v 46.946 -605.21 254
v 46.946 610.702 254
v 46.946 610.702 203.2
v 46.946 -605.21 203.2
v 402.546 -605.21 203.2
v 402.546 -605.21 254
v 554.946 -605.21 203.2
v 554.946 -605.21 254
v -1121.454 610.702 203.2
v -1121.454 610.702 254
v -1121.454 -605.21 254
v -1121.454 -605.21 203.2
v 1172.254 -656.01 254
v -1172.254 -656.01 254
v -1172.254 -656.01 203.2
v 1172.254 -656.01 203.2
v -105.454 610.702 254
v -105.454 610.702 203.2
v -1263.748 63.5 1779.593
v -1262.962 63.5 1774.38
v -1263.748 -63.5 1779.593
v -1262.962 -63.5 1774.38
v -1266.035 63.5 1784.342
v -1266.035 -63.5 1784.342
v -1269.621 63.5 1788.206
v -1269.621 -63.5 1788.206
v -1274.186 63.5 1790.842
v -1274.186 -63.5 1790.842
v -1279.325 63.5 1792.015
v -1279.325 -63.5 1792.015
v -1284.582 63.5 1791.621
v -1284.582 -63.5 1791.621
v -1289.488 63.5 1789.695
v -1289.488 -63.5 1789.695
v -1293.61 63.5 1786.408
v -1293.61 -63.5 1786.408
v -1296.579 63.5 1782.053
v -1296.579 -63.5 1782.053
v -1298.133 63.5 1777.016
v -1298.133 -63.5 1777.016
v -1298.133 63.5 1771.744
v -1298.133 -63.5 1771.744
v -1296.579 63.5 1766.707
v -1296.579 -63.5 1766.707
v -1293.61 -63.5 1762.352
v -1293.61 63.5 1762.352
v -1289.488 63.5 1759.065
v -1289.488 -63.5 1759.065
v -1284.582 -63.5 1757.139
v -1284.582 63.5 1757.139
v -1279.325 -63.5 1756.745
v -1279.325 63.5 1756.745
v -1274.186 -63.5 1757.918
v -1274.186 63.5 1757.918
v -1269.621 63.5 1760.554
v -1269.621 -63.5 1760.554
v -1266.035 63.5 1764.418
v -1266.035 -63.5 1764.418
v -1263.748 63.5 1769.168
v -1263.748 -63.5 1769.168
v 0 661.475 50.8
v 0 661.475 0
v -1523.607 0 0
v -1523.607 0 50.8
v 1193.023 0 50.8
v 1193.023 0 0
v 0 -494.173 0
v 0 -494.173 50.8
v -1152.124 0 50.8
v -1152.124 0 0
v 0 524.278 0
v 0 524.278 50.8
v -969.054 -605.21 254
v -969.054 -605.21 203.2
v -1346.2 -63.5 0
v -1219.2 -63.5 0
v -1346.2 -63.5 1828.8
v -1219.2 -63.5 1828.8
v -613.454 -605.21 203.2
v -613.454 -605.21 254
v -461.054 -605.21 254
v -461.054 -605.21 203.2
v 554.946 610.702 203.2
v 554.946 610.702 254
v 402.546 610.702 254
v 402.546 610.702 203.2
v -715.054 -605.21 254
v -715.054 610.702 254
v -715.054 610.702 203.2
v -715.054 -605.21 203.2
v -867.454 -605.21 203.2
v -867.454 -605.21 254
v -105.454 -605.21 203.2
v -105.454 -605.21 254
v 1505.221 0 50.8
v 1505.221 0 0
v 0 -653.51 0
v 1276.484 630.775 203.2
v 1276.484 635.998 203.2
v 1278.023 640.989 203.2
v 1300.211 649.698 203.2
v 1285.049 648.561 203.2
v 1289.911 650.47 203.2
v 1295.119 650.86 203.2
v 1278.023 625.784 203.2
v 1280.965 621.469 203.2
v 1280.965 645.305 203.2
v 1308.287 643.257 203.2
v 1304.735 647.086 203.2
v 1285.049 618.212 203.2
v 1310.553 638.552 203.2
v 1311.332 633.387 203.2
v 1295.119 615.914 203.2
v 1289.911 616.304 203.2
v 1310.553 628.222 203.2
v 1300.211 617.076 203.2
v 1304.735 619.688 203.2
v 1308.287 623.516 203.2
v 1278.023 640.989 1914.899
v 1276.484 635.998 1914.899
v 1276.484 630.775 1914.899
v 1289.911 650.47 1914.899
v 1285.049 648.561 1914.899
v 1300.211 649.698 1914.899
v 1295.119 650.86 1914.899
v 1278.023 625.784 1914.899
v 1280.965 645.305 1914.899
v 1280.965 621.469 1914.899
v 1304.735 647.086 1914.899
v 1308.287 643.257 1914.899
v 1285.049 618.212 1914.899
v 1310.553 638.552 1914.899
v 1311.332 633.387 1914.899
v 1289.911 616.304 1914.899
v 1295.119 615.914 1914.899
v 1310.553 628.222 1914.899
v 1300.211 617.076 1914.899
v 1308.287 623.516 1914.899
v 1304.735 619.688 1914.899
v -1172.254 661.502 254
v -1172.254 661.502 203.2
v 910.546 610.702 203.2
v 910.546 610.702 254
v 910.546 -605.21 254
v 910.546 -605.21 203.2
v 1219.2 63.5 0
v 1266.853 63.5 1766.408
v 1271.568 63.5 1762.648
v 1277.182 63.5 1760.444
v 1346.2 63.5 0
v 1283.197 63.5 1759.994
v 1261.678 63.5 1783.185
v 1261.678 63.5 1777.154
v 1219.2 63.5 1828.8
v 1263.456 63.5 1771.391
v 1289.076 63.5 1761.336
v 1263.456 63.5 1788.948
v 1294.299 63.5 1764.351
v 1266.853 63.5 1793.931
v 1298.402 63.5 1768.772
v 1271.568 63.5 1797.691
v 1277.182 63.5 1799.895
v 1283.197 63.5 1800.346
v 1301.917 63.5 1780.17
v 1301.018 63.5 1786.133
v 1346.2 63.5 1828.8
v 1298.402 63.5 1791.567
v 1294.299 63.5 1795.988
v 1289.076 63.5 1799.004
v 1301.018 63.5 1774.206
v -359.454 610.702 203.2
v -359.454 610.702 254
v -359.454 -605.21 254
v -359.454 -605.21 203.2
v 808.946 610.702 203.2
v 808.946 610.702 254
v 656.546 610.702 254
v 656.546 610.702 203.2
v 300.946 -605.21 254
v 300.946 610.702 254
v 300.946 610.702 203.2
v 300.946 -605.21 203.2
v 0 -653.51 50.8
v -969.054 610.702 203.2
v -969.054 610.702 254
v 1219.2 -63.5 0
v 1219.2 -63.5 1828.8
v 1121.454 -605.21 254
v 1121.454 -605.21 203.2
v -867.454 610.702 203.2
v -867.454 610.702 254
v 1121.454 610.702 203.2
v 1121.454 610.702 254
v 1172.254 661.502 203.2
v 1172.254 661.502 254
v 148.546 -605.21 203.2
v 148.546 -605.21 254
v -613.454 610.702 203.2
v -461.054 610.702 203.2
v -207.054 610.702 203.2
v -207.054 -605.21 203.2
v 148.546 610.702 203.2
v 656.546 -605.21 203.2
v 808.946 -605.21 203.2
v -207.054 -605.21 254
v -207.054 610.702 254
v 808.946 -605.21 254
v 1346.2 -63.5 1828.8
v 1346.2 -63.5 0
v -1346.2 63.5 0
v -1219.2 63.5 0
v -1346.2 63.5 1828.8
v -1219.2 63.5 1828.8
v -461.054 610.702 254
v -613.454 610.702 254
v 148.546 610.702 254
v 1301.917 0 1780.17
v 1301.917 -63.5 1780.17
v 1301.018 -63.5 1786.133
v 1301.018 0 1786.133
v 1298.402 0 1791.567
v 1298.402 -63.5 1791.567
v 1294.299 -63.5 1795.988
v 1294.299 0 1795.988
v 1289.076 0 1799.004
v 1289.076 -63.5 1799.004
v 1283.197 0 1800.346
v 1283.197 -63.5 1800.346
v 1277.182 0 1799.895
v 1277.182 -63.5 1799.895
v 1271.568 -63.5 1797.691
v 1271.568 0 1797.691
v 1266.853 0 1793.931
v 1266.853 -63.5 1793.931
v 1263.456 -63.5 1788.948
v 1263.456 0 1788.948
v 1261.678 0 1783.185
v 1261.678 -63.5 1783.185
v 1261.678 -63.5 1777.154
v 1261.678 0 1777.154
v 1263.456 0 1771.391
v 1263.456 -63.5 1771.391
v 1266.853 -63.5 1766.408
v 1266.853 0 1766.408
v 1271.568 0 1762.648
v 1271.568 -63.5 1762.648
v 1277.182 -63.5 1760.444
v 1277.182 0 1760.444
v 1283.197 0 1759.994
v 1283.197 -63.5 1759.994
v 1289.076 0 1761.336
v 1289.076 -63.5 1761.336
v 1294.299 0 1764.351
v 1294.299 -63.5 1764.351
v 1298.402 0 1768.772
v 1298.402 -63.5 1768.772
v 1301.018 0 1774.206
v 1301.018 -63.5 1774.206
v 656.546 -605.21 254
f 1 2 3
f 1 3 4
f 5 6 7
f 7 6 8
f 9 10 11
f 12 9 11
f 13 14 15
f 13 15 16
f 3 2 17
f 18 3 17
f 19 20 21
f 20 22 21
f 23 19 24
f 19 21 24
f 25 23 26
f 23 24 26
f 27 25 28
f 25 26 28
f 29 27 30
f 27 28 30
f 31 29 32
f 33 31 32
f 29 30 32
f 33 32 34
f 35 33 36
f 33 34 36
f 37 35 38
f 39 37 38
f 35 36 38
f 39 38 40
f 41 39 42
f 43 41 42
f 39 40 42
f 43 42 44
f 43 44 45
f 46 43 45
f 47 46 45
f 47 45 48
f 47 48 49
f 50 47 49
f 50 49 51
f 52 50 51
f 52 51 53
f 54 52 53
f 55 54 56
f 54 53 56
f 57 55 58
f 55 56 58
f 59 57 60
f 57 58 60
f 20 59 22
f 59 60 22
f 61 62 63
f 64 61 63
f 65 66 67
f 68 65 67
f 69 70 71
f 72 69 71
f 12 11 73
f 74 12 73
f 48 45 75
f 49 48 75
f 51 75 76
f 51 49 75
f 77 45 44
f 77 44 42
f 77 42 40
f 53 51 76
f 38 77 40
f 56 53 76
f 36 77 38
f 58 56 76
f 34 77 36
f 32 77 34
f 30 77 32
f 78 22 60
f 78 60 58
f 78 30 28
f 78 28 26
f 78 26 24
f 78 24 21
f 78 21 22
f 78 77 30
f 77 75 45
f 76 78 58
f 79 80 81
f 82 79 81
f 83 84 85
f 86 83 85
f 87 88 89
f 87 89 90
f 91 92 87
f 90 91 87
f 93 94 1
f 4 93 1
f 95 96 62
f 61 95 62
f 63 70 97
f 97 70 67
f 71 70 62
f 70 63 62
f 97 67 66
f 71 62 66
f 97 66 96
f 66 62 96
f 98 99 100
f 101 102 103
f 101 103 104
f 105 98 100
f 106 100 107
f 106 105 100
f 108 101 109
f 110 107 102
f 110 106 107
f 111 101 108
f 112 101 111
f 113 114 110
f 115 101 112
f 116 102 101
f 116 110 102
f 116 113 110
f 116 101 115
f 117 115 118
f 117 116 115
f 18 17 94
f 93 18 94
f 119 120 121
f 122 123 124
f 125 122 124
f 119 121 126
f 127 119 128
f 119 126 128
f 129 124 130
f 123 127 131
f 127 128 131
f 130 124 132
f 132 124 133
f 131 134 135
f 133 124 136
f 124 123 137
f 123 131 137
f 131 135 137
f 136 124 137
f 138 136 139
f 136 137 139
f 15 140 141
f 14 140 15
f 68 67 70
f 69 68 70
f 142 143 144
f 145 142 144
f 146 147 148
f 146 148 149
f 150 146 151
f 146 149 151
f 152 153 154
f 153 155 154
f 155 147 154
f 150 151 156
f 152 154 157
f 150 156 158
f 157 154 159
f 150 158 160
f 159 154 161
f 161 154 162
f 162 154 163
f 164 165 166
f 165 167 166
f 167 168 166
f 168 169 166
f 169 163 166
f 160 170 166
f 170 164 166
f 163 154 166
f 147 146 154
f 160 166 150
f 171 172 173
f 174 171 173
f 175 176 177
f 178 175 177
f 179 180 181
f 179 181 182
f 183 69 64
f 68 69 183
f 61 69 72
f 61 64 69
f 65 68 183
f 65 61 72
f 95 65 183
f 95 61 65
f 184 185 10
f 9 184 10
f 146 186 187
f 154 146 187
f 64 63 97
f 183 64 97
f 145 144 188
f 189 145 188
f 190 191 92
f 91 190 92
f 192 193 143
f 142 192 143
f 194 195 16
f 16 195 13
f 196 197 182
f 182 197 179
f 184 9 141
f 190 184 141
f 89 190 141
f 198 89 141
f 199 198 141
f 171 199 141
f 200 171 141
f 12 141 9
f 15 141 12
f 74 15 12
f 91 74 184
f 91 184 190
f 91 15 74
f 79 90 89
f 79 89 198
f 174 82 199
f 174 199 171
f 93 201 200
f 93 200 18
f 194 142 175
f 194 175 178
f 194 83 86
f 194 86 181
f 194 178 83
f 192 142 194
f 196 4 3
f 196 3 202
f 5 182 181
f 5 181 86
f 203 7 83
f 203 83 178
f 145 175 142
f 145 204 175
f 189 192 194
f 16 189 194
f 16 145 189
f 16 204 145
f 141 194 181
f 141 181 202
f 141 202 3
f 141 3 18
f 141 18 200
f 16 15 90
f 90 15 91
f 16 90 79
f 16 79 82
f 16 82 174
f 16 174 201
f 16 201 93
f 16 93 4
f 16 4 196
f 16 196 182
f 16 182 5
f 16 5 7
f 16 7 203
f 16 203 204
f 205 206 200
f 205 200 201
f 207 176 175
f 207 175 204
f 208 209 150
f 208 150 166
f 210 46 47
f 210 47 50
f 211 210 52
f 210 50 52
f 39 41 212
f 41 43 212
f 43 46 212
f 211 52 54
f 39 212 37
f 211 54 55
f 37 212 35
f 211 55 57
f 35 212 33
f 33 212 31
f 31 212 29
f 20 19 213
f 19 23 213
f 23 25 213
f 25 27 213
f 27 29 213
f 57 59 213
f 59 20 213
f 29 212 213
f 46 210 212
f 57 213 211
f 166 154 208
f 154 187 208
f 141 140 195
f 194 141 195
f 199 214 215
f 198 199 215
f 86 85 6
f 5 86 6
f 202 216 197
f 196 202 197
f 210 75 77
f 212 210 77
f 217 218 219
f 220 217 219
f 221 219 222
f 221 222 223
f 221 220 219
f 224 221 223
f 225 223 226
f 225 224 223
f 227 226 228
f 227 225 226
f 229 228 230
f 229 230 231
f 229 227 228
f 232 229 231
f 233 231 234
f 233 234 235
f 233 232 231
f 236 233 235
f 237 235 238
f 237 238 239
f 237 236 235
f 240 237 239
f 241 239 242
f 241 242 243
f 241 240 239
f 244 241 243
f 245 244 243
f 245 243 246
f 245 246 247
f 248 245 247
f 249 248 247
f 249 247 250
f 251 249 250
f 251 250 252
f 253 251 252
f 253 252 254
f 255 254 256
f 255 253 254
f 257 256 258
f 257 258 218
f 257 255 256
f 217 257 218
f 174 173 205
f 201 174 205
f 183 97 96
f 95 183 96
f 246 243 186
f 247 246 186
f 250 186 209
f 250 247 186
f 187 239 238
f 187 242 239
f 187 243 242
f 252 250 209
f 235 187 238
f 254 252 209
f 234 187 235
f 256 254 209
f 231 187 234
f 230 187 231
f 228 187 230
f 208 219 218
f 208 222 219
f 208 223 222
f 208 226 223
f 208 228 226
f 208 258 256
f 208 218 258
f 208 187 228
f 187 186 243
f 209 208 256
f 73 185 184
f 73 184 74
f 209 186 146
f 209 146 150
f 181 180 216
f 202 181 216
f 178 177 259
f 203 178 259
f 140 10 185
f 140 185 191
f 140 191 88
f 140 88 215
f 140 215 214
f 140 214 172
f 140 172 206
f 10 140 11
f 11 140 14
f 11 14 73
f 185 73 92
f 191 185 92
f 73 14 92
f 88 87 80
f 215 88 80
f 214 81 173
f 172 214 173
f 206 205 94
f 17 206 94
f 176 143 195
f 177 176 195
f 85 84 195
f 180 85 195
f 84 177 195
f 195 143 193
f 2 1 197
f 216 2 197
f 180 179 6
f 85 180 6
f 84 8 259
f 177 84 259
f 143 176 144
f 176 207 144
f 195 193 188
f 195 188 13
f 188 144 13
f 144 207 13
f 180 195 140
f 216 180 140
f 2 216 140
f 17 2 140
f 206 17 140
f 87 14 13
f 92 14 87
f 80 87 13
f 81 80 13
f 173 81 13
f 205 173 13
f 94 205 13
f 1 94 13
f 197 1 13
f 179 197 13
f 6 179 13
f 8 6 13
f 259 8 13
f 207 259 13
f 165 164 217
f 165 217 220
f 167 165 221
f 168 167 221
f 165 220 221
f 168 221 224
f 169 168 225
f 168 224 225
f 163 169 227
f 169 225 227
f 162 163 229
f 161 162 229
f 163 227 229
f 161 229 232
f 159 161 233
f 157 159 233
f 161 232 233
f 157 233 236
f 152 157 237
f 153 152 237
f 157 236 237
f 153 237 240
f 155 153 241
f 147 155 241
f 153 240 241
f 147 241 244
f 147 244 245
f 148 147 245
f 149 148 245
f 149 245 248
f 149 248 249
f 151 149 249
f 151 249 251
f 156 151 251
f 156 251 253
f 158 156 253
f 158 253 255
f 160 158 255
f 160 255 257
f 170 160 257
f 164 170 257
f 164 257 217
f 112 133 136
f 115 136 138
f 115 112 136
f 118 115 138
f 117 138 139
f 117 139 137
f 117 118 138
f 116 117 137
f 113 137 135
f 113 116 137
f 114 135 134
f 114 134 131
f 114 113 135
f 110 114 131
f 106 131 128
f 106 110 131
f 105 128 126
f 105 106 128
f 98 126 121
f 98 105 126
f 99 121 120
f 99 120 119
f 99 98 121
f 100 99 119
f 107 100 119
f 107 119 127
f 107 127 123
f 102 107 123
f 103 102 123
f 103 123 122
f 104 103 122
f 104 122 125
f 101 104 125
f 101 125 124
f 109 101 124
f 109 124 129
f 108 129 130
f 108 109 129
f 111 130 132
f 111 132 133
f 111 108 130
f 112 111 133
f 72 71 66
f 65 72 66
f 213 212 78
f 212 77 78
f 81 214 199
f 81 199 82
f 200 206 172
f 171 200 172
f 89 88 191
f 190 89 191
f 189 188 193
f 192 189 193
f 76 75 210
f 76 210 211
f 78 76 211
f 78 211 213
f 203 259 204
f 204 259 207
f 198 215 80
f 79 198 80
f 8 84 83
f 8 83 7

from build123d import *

# Parameters (mm, degrees)
F0_W          = 127
F0_H          = 1828.8
F1_DEPTH      = 63.5
F2_W          = 2344.5084095001
F2_H          = 1312.0200634003
F3_DEPTH      = 76.2
F4_R          = 17.6840509658
F5_DEPTH      = 656.0110317001
F5_DEPTH_BACK = 166.414886713
F6_R          = 20.2324998559
F7_DEPTH      = 63.5
F7_DEPTH_BACK = 170.9811687469
F9_DEPTH      = 50.8
F10_W         = 2344.5084095001
F10_H         = 135.2661035061
F11_DEPTH     = 1320.8
F13_W         = 2344.5084095001
F13_H         = 1317.5123929977
F13_W_2       = 101.6
F13_H_2       = 1215.9123929977
F14_DEPTH     = 50.8
F16_DEPTH     = 50.8
F21_R         = 17.5219317268
F22_DEPTH     = 1711.6990089417


with BuildPart() as f1:
    # F0 (on Front) → F1 (new body, symmetric)
    with BuildSketch(Plane.XZ):
        with Locations((-1282.7, 914.4)):
            Rectangle(F0_W, F0_H)
    extrude(amount=F1_DEPTH, both=True)

    # F4 (on Front) → F5 (cut, two sides)
    with BuildSketch(Plane.XZ) as f5_sk:
        with Locations((-1280.646443367, 1774.3800878525)):
            Circle(F4_R)
    extrude(amount=F5_DEPTH, mode=Mode.SUBTRACT)
    extrude(f5_sk.sketch, amount=-F5_DEPTH_BACK, mode=Mode.SUBTRACT)


with BuildPart() as f1b:
    # F0 (on Front) → F1, piece 2 (new body, symmetric)
    with BuildSketch(Plane.XZ):
        with Locations((1282.7, 914.4)):
            Rectangle(F0_W, F0_H)
    extrude(amount=F1_DEPTH, both=True)

    # F6 (on Front) → F7 (cut, two sides)
    with BuildSketch(Plane.XZ) as f7_sk:
        with Locations((1281.6846370697, 1780.1696062088)):
            Circle(F6_R)
    extrude(amount=F7_DEPTH, mode=Mode.SUBTRACT)
    extrude(f7_sk.sketch, amount=-F7_DEPTH_BACK, mode=Mode.SUBTRACT)


with BuildPart() as f3:
    # F2 (on Top) → F3 (new body)
    with BuildSketch(Plane.XY):
        Rectangle(F2_W, F2_H)
    extrude(amount=F3_DEPTH)


with BuildPart() as f9:
    # F8 (on Top) → F9 (new body)
    with BuildSketch(Plane.XY):
        Polygon((0, 661.4745634012), (-1523.6068986396, 0), (0, -653.5100268468), (1505.2209768039, 0), align=None)
        Polygon((0, -494.172642375), (-1152.1243991841, 0), (0, 524.2779540986), (1193.022706916, 0), align=None, mode=Mode.SUBTRACT)
    extrude(amount=F9_DEPTH)


with BuildPart() as f11:
    # F10 (on face) → F11 (new body)
    with BuildSketch(Plane.XZ.offset(656.0100317001)):
        with Locations((0, 321.633051753)):
            Rectangle(F10_W, F10_H)
    extrude(amount=-F11_DEPTH)

    # F13 (on face) → F14 (join)
    with BuildSketch(Plane(origin=(0, 0, 254), x_dir=(1, 0, 0), z_dir=(0, 0, -1))):
        with Locations((0, -2.7461647987)):
            Rectangle(F13_W, F13_H)
        Polygon((-1121.4542047501, -610.7023612976), (-1121.4542047501, 605.2100317001), (-969.0542047501, 605.2100317001), (-867.4542047501, 605.2100317001), (-715.0542047501, 605.2100317001), (-613.4542047501, 605.2100317001), (-461.0542047501, 605.2100317001), (-359.4542047501, 605.2100317001), (-207.0542047501, 605.2100317001), (-105.4542047501, 605.2100317001), (46.9457952499, 605.2100317001), (148.5457952499, 605.2100317001), (300.9457952499, 605.2100317001), (402.5457952499, 605.2100317001), (554.9457952499, 605.2100317001), (656.5457952499, 605.2100317001), (808.9457952499, 605.2100317001), (910.5457952499, 605.2100317001), (1121.4542047501, 605.2100317001), (1121.4542047501, -610.7023612976), (910.5457952499, -610.7023612976), (808.9457952499, -610.7023612976), (656.5457952499, -610.7023612976), (554.9457952499, -610.7023612976), (402.5457952499, -610.7023612976), (300.9457952499, -610.7023612976), (148.5457952499, -610.7023612976), (46.9457952499, -610.7023612976), (-105.4542047501, -610.7023612976), (-207.0542047501, -610.7023612976), (-359.4542047501, -610.7023612976), (-461.0542047501, -610.7023612976), (-613.4542047501, -610.7023612976), (-715.0542047501, -610.7023612976), (-867.4542047501, -610.7023612976), (-969.0542047501, -610.7023612976), align=None, mode=Mode.SUBTRACT)
        with Locations((605.7457952499, -2.7461647987)):
            Rectangle(F13_W_2, F13_H_2)
        with Locations((-156.2542047501, -2.7461647987)):
            Rectangle(F13_W_2, F13_H_2)
        with Locations((-664.2542047501, -2.7461647987)):
            Rectangle(F13_W_2, F13_H_2)
        with Locations((97.7457952499, -2.7461647987)):
            Rectangle(F13_W_2, F13_H_2)
        with Locations((-410.2542047501, -2.7461647987)):
            Rectangle(F13_W_2, F13_H_2)
        with Locations((859.7457952499, -2.7461647987)):
            Rectangle(F13_W_2, F13_H_2)
        with Locations((-918.2542047501, -2.7461647987)):
            Rectangle(F13_W_2, F13_H_2)
        with Locations((351.7457952499, -2.7461647987)):
            Rectangle(F13_W_2, F13_H_2)
    extrude(amount=F14_DEPTH)


with BuildPart() as f16:
    # F13 (on face) → F16 (new body)
    with BuildSketch(Plane(origin=(0, 0, 254), x_dir=(1, 0, 0), z_dir=(0, 0, -1))):
        with Locations((0, -2.7461647987)):
            Rectangle(F13_W, F13_H)
        Polygon((-1121.4542047501, -610.7023612976), (-1121.4542047501, 605.2100317001), (-969.0542047501, 605.2100317001), (-867.4542047501, 605.2100317001), (-715.0542047501, 605.2100317001), (-613.4542047501, 605.2100317001), (-461.0542047501, 605.2100317001), (-359.4542047501, 605.2100317001), (-207.0542047501, 605.2100317001), (-105.4542047501, 605.2100317001), (46.9457952499, 605.2100317001), (148.5457952499, 605.2100317001), (300.9457952499, 605.2100317001), (402.5457952499, 605.2100317001), (554.9457952499, 605.2100317001), (656.5457952499, 605.2100317001), (808.9457952499, 605.2100317001), (910.5457952499, 605.2100317001), (1121.4542047501, 605.2100317001), (1121.4542047501, -610.7023612976), (910.5457952499, -610.7023612976), (808.9457952499, -610.7023612976), (656.5457952499, -610.7023612976), (554.9457952499, -610.7023612976), (402.5457952499, -610.7023612976), (300.9457952499, -610.7023612976), (148.5457952499, -610.7023612976), (46.9457952499, -610.7023612976), (-105.4542047501, -610.7023612976), (-207.0542047501, -610.7023612976), (-359.4542047501, -610.7023612976), (-461.0542047501, -610.7023612976), (-613.4542047501, -610.7023612976), (-715.0542047501, -610.7023612976), (-867.4542047501, -610.7023612976), (-969.0542047501, -610.7023612976), align=None, mode=Mode.SUBTRACT)
        with Locations((-918.2542047501, -2.7461647987)):
            Rectangle(F13_W_2, F13_H_2)
        with Locations((-664.2542047501, -2.7461647987)):
            Rectangle(F13_W_2, F13_H_2)
        with Locations((-410.2542047501, -2.7461647987)):
            Rectangle(F13_W_2, F13_H_2)
        with Locations((-156.2542047501, -2.7461647987)):
            Rectangle(F13_W_2, F13_H_2)
        with Locations((97.7457952499, -2.7461647987)):
            Rectangle(F13_W_2, F13_H_2)
        with Locations((351.7457952499, -2.7461647987)):
            Rectangle(F13_W_2, F13_H_2)
        with Locations((605.7457952499, -2.7461647987)):
            Rectangle(F13_W_2, F13_H_2)
        with Locations((859.7457952499, -2.7461647987)):
            Rectangle(F13_W_2, F13_H_2)
    extrude(amount=F16_DEPTH)


with BuildPart() as f22:
    # F21 (on face) → F22 (new body)
    with BuildSketch(Plane(origin=(0, 0, 203.2), x_dir=(1, 0, 0), z_dir=(0, 0, -1))):
        with Locations((1293.8097715378, -633.3869099617)):
            Circle(F21_R)
    extrude(amount=-F22_DEPTH)


solid = Compound([f1.part, f1b.part, f9.part, f16.part, f22.part])
